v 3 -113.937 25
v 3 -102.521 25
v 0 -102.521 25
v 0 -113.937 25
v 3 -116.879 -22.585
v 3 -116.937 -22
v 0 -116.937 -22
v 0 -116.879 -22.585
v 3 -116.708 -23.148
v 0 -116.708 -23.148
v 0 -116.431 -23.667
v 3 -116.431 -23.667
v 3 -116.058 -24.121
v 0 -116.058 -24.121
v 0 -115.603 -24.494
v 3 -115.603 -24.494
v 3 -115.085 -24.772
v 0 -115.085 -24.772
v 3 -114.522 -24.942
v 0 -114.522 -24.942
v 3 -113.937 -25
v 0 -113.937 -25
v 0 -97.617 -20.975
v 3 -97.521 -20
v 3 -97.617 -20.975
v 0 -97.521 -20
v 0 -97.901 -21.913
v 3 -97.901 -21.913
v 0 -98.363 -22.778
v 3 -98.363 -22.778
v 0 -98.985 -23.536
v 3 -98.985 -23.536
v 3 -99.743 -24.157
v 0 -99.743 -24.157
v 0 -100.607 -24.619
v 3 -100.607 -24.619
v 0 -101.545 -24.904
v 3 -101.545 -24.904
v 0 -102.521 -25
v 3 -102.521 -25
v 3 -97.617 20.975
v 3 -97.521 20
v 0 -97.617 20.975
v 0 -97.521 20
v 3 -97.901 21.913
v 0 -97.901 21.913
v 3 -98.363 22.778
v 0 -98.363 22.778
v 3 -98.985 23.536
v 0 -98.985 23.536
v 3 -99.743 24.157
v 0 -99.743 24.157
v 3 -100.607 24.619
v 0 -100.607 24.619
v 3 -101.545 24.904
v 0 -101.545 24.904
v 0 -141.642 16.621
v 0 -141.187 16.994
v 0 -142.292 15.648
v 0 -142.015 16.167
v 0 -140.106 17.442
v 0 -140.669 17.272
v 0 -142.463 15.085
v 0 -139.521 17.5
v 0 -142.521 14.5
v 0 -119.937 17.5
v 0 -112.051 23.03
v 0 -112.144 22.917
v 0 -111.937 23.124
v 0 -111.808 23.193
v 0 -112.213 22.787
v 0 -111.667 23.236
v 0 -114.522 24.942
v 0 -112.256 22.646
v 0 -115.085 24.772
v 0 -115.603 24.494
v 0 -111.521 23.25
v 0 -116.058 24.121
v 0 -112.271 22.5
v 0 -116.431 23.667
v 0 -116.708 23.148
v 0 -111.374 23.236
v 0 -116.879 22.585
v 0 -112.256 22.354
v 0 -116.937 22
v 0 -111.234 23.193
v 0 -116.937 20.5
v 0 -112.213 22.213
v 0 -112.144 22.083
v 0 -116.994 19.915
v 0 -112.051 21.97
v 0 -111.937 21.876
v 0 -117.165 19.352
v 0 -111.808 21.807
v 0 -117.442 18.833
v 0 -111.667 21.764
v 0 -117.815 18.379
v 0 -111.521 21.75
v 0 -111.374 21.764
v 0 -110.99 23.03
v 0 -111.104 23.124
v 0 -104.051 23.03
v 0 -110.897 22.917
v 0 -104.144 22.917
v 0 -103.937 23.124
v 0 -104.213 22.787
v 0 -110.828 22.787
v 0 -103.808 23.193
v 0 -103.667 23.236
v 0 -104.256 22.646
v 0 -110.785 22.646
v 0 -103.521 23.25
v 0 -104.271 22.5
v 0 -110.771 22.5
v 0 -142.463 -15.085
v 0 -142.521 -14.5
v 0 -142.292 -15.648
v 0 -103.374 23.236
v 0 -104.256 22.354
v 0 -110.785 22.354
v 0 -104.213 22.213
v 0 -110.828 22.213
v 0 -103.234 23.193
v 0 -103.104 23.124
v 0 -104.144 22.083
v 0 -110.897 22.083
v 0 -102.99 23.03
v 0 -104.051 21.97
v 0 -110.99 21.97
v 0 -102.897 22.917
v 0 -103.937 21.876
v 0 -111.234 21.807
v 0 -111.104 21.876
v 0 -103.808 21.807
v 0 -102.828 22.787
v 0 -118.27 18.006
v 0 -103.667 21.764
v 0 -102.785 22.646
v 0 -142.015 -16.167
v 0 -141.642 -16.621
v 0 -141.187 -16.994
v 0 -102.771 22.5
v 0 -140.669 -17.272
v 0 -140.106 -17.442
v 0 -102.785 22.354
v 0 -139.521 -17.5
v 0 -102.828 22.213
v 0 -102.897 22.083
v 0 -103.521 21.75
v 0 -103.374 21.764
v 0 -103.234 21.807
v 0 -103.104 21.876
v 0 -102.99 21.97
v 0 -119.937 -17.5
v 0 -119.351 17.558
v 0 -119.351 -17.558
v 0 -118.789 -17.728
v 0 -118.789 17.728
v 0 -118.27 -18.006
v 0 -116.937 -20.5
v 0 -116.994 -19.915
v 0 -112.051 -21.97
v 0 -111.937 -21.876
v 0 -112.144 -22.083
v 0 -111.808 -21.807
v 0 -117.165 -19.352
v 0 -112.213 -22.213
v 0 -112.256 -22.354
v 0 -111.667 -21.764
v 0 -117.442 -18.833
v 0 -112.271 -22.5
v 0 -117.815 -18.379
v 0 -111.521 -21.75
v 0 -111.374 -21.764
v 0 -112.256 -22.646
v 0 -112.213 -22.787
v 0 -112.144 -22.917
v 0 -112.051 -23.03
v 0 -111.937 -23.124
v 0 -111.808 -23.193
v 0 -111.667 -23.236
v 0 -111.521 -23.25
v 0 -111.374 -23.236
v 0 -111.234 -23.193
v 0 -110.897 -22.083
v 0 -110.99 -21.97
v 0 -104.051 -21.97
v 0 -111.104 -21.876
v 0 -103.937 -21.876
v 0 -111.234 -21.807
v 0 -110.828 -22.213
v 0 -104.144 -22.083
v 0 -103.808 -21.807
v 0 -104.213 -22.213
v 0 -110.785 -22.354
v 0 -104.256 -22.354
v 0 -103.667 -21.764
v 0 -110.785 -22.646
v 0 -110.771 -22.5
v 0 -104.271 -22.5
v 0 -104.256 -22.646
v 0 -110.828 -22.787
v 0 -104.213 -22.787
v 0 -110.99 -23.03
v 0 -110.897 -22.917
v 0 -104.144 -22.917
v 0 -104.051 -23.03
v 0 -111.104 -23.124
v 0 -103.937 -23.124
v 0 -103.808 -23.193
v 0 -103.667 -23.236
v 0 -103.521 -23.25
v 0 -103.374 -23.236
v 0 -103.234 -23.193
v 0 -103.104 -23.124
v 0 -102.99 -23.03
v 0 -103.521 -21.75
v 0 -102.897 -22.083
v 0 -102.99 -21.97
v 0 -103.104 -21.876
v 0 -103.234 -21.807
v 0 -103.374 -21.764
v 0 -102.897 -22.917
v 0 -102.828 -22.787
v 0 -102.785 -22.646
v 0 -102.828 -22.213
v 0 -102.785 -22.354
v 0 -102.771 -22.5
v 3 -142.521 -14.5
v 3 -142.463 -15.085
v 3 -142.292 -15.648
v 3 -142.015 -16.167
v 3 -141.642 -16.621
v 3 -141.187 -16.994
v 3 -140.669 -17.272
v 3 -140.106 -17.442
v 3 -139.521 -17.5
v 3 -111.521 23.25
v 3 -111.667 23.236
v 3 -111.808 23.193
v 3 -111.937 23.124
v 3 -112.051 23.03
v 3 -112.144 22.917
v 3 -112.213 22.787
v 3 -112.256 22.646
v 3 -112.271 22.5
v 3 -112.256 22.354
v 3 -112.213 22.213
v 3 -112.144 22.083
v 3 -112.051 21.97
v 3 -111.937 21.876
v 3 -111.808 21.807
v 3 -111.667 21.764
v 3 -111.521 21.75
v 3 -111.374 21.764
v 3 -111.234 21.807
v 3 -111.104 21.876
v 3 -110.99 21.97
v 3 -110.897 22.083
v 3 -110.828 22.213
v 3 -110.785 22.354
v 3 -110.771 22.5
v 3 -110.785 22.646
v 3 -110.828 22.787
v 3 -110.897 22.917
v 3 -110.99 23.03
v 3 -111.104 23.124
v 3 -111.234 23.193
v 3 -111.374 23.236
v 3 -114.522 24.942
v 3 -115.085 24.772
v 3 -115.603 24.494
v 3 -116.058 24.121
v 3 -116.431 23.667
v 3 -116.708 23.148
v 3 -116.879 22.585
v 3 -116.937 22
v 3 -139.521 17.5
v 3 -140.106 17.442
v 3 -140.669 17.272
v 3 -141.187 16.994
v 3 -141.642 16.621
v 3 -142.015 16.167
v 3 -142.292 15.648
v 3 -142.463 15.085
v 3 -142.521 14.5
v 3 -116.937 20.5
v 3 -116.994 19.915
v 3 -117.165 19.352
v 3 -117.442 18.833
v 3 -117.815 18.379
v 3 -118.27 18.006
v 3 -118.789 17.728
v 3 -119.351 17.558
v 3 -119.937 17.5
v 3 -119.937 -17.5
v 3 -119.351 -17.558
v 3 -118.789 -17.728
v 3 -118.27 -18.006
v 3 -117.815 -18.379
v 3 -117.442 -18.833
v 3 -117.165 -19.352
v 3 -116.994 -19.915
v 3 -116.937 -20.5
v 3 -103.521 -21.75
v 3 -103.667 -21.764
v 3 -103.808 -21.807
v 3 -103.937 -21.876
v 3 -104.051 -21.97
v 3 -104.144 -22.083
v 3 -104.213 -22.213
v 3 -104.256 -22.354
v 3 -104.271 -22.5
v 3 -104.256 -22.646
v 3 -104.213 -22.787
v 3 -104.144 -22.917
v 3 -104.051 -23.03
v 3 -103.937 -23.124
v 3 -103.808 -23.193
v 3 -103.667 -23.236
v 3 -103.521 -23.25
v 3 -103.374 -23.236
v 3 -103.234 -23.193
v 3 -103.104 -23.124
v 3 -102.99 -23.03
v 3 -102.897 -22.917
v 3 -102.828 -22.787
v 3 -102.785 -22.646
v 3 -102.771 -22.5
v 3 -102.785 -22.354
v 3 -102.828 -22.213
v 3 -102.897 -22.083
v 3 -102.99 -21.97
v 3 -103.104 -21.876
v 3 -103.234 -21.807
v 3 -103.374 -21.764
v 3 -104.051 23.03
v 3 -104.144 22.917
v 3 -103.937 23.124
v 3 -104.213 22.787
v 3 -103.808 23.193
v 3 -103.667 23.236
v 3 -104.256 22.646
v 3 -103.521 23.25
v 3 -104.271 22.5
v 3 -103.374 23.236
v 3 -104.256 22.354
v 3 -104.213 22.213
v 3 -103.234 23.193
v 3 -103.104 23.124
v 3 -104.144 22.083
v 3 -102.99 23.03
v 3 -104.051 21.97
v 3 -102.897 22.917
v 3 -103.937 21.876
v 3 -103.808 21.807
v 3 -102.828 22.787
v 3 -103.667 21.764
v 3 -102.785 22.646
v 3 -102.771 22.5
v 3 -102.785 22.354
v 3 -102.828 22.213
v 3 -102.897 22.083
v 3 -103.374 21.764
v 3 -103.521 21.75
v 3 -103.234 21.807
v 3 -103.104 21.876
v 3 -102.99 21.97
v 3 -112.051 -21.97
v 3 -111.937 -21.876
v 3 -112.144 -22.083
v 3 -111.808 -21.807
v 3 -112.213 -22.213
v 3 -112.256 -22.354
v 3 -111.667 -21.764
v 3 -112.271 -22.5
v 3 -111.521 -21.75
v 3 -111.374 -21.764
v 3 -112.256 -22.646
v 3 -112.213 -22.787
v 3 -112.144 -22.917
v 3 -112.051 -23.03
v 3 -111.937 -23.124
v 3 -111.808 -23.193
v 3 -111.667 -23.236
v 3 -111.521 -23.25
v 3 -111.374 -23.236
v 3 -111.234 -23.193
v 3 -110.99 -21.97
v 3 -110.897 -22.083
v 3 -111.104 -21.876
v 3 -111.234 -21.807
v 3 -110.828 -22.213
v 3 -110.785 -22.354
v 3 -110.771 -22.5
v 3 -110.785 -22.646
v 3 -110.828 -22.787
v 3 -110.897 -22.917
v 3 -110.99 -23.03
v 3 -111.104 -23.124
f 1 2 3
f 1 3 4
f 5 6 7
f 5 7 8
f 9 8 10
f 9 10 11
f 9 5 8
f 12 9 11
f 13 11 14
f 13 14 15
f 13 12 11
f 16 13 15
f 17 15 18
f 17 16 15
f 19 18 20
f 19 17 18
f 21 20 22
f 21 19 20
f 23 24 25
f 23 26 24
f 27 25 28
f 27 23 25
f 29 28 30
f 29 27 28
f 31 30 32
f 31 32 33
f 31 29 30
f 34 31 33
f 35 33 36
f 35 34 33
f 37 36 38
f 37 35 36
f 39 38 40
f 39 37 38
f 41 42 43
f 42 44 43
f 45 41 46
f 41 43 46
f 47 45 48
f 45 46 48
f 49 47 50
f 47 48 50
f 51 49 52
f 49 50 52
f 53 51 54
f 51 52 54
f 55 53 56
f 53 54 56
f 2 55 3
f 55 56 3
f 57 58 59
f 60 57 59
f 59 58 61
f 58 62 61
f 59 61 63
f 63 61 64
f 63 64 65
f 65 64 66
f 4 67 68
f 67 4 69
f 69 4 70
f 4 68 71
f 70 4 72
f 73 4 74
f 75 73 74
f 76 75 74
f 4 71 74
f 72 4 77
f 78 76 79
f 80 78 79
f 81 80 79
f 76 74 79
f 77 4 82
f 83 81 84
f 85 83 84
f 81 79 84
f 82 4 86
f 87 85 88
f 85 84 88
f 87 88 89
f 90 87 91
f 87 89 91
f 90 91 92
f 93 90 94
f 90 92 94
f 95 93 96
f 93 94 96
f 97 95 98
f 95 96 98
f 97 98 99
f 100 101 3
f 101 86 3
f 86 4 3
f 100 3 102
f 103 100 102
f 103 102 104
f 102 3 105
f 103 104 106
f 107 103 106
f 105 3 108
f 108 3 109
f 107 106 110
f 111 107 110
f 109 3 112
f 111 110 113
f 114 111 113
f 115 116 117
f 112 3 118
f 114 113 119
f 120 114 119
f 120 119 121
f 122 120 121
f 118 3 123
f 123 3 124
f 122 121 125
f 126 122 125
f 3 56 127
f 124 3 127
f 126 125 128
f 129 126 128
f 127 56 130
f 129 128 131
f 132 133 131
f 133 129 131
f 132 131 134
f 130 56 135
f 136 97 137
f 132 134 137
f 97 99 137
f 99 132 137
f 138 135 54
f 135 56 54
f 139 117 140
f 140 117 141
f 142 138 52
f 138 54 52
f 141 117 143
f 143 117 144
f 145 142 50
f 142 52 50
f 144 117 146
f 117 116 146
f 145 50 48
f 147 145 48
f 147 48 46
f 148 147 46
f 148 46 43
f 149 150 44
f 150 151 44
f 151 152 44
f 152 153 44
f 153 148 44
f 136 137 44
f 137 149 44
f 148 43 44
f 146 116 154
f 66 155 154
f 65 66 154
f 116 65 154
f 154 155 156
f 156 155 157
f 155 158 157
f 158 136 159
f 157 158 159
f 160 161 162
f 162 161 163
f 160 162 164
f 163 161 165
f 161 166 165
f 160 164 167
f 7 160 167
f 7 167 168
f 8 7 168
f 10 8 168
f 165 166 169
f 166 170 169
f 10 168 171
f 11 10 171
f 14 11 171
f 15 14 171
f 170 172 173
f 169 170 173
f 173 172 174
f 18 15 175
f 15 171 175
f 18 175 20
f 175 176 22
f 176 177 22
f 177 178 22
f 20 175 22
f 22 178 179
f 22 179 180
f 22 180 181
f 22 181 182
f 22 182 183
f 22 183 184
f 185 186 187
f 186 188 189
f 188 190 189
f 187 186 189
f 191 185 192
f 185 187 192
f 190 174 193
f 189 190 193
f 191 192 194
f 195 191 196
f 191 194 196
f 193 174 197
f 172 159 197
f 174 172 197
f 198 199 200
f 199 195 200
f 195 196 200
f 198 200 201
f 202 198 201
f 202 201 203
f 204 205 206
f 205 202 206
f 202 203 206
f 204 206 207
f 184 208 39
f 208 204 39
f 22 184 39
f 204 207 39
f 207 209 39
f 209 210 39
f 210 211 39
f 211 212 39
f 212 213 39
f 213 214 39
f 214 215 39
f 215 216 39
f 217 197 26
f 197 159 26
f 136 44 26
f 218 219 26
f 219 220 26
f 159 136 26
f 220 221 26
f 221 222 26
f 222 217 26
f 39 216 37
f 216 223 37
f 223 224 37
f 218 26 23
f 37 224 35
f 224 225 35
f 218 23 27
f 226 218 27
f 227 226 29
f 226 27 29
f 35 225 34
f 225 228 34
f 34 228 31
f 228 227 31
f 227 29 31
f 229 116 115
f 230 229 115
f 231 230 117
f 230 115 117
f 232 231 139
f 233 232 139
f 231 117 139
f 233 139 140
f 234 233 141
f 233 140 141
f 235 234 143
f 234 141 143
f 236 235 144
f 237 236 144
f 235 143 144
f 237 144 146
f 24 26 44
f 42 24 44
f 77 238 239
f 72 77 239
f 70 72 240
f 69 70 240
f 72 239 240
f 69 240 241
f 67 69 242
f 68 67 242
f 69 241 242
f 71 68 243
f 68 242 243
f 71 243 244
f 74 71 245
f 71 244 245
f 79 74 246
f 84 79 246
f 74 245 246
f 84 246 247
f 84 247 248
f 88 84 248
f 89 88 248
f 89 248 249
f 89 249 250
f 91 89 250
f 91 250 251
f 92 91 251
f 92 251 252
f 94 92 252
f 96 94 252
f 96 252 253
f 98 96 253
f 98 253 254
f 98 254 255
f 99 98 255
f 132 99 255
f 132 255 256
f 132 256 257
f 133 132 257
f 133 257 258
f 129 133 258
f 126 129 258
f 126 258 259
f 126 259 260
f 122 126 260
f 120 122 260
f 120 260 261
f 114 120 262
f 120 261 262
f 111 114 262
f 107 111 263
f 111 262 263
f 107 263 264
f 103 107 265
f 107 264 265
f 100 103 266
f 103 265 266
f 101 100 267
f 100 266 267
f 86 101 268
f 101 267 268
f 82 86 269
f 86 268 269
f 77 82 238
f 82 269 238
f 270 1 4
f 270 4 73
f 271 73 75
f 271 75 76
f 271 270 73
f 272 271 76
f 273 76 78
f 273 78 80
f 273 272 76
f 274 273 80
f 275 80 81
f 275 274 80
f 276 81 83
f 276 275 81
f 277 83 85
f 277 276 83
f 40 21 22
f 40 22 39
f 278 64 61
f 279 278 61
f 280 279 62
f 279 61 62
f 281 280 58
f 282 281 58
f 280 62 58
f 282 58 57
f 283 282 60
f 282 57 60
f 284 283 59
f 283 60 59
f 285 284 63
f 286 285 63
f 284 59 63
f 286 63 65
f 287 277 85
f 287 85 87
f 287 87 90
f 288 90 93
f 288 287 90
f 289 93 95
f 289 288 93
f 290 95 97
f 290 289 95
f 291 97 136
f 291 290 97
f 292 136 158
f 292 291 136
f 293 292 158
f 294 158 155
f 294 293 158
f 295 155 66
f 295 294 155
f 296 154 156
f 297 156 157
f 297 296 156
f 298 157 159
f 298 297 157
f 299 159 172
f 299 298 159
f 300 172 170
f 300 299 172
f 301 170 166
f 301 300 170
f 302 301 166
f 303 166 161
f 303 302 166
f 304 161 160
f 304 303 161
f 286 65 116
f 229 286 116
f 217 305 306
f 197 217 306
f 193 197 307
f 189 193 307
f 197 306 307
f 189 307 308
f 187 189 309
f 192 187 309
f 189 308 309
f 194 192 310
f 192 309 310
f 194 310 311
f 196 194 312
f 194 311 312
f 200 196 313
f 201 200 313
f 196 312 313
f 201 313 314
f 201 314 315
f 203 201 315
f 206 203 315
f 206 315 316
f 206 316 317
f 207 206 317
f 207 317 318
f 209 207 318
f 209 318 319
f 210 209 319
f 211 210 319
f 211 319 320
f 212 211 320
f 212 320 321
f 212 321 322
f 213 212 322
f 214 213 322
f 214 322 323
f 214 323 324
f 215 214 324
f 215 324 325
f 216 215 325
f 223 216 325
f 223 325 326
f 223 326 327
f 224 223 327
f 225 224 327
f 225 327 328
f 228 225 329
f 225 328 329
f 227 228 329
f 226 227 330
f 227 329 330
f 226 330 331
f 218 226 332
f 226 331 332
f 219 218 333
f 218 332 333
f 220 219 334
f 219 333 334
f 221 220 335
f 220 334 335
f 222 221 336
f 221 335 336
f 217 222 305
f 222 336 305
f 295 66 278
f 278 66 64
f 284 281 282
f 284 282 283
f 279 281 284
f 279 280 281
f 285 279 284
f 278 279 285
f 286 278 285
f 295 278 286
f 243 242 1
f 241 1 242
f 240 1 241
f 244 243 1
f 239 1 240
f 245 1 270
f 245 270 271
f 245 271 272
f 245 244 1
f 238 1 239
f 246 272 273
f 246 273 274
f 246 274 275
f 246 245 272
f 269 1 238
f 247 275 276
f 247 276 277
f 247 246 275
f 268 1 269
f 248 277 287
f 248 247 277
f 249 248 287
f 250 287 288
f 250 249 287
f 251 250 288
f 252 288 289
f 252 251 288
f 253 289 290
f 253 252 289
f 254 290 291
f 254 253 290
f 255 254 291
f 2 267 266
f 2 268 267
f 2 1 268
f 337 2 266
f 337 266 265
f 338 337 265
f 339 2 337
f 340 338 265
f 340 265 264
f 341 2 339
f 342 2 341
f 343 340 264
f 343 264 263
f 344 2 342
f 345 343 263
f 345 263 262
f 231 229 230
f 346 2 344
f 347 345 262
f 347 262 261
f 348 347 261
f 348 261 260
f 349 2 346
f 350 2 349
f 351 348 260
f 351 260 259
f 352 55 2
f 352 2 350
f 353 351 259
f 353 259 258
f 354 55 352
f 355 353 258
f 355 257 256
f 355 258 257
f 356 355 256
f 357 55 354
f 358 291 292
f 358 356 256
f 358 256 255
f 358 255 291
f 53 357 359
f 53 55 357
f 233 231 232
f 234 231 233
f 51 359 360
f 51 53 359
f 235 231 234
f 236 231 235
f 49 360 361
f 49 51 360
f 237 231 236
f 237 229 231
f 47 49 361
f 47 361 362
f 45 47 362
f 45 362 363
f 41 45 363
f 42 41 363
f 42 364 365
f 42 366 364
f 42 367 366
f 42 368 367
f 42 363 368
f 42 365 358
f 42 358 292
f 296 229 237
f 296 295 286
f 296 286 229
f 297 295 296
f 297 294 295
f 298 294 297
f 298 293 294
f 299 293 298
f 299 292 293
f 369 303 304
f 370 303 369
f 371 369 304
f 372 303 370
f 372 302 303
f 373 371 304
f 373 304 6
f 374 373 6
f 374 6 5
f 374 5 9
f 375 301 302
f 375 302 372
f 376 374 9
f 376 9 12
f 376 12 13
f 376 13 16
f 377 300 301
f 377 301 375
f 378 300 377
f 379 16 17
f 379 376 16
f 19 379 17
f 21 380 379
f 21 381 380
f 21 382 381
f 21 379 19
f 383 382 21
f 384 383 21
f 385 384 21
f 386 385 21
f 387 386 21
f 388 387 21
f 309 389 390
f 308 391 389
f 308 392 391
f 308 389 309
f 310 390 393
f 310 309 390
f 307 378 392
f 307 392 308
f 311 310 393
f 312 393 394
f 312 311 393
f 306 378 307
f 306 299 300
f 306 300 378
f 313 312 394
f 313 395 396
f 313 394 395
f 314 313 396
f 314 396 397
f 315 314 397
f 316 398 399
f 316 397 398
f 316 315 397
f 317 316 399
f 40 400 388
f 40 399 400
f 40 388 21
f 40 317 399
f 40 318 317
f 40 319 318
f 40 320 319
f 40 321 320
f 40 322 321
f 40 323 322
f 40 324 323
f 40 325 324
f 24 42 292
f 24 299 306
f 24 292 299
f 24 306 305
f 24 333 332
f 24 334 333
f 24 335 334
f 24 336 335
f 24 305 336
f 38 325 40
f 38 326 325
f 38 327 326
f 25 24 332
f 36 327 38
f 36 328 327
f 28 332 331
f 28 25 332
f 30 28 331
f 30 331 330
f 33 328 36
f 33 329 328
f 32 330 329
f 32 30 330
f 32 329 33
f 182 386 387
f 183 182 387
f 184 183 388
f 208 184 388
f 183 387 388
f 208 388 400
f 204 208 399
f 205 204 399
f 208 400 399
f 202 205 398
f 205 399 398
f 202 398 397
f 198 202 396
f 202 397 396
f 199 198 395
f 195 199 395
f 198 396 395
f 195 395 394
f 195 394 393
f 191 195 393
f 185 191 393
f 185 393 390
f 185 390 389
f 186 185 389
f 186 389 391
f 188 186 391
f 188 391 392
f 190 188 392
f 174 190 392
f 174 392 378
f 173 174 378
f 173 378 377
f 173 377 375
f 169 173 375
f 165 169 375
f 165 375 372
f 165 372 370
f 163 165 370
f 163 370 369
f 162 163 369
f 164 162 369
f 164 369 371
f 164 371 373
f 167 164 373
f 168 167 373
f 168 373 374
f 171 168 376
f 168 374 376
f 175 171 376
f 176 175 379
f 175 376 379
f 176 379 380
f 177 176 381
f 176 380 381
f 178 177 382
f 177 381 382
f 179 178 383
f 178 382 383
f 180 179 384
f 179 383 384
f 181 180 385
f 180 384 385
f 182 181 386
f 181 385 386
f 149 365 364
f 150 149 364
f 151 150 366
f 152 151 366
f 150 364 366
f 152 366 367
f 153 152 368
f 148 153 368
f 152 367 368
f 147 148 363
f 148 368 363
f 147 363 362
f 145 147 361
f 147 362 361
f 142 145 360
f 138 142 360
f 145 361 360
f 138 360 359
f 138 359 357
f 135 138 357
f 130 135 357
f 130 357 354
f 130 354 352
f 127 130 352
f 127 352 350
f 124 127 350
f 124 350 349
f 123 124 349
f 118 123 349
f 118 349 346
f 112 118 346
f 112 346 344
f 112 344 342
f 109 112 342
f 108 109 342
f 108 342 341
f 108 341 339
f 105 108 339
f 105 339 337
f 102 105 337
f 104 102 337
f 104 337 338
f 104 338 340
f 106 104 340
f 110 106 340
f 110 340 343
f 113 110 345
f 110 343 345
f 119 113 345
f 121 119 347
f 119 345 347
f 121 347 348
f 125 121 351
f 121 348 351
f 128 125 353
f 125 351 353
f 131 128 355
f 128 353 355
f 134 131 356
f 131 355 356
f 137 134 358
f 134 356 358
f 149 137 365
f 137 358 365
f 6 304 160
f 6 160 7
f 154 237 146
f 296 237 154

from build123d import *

# Parameters (mm, degrees)
BOSS_EXTRUDE1_DEPTH = 3
SKETCH2_R           = 0.75
CUT_EXTRUDE1_DEPTH  = 146.674630793
CUT_EXTRUDE2_DEPTH  = 10
FILLET1_R           = 5
FILLET2_R           = 5


with BuildPart() as part:
    # Sketch1 → Boss-Extrude1 (new body)
    with BuildSketch(Plane(origin=(0, 0, 0), x_dir=(0, 0, -1), z_dir=(1, 0, 0))):
        with BuildLine():
            Line((-30, -97.52051802), (-30, -109.52051802))
            ThreePointArc((-30, -109.52051802), (-27.656854249, -115.177372269), (-22, -117.52051802))
            Line((-22, -117.52051802), (-21.5, -117.52051802))
            ThreePointArc((-21.5, -117.52051802), (-18.671572875, -118.692090895), (-17.5, -121.52051802))
            Line((-17.5, -121.52051802), (-17.5, -139.52051802))
            ThreePointArc((-17.5, -139.52051802), (-16.621320344, -141.641838363), (-14.5, -142.52051802))
            Line((-14.5, -142.52051802), (14.5, -142.52051802))
            ThreePointArc((14.5, -142.52051802), (16.621320344, -141.641838363), (17.5, -139.52051802))
            Line((17.5, -139.52051802), (17.5, -121.52051802))
            ThreePointArc((17.5, -121.52051802), (18.671572875, -118.692090895), (21.5, -117.52051802))
            Line((21.5, -117.52051802), (22, -117.52051802))
            ThreePointArc((22, -117.52051802), (27.656854249, -115.177372269), (30, -109.52051802))
            Line((30, -109.52051802), (30, -97.52051802))
            Line((30, -97.52051802), (-30, -97.52051802))
        make_face()
    extrude(amount=BOSS_EXTRUDE1_DEPTH)

    # Sketch2 → Cut-Extrude1 (cut, through all)
    with BuildSketch(Plane(origin=(3, 0, 0), x_dir=(0, 0, -1), z_dir=(1, 0, 0))):
        with Locations((-22.5, -103.52051802)):
            Circle(SKETCH2_R)
        with Locations(Location((-22.5, -111.52051802, 0), (0, 0, 180))):
            Circle(SKETCH2_R)
        with Locations((22.5, -111.52051802)):
            Circle(SKETCH2_R)
        with Locations(Location((22.5, -103.52051802, 0), (0, 0, 180))):
            Circle(SKETCH2_R)
    extrude(amount=-CUT_EXTRUDE1_DEPTH, mode=Mode.SUBTRACT)

    # Sketch3 → Cut-Extrude2 (cut)
    with BuildSketch(Plane(origin=(3, 0, 0), x_dir=(0, 0, -1), z_dir=(1, 0, 0))):
        with BuildLine():
            Line((-30, -97.52051802), (-25, -97.52051802))
            Line((-25, -97.52051802), (-25, -113.936716507))
            ThreePointArc((-25, -113.936716507), (-24.121320344, -116.05803685), (-22, -116.936716507))
            Line((-22, -116.936716507), (-20.5, -116.936716507))
            ThreePointArc((-20.5, -116.936716507), (-18.378679656, -117.815396163), (-17.5, -119.936716507))
            Line((-17.5, -119.936716507), (-17.5, -122.452918804))
            Line((-17.5, -122.452918804), (-42.892449252, -122.452918804))
            Line((-42.892449252, -122.452918804), (-42.892449252, -97.52051802))
            Line((-42.892449252, -97.52051802), (-30, -97.52051802))
        make_face()
        with BuildLine():
            Line((20.5, -116.936716507), (22, -116.936716507))
            ThreePointArc((22, -116.936716507), (24.121320344, -116.05803685), (25, -113.936716507))
            Line((25, -113.936716507), (25, -97.52051802))
            Line((25, -97.52051802), (30, -97.52051802))
            Line((30, -97.52051802), (42.892449252, -97.52051802))
            Line((42.892449252, -97.52051802), (42.892449252, -122.452918804))
            Line((42.892449252, -122.452918804), (17.5, -122.452918804))
            Line((17.5, -122.452918804), (17.5, -119.936716507))
            ThreePointArc((17.5, -119.936716507), (18.378679656, -117.815396163), (20.5, -116.936716507))
        make_face()
    extrude(amount=-CUT_EXTRUDE2_DEPTH, mode=Mode.SUBTRACT)

    # Fillet1
    fillet1_edges = [part.edges().sort_by_distance(p)[0] for p in [
        (1.5, -97.52051802, 25),
    ]]
    fillet(fillet1_edges, radius=FILLET1_R)

    # Fillet2
    fillet2_edges = [part.edges().sort_by_distance(p)[0] for p in [
        (1.5, -97.52051802, -25),
    ]]
    fillet(fillet2_edges, radius=FILLET2_R)


solid = part.part
